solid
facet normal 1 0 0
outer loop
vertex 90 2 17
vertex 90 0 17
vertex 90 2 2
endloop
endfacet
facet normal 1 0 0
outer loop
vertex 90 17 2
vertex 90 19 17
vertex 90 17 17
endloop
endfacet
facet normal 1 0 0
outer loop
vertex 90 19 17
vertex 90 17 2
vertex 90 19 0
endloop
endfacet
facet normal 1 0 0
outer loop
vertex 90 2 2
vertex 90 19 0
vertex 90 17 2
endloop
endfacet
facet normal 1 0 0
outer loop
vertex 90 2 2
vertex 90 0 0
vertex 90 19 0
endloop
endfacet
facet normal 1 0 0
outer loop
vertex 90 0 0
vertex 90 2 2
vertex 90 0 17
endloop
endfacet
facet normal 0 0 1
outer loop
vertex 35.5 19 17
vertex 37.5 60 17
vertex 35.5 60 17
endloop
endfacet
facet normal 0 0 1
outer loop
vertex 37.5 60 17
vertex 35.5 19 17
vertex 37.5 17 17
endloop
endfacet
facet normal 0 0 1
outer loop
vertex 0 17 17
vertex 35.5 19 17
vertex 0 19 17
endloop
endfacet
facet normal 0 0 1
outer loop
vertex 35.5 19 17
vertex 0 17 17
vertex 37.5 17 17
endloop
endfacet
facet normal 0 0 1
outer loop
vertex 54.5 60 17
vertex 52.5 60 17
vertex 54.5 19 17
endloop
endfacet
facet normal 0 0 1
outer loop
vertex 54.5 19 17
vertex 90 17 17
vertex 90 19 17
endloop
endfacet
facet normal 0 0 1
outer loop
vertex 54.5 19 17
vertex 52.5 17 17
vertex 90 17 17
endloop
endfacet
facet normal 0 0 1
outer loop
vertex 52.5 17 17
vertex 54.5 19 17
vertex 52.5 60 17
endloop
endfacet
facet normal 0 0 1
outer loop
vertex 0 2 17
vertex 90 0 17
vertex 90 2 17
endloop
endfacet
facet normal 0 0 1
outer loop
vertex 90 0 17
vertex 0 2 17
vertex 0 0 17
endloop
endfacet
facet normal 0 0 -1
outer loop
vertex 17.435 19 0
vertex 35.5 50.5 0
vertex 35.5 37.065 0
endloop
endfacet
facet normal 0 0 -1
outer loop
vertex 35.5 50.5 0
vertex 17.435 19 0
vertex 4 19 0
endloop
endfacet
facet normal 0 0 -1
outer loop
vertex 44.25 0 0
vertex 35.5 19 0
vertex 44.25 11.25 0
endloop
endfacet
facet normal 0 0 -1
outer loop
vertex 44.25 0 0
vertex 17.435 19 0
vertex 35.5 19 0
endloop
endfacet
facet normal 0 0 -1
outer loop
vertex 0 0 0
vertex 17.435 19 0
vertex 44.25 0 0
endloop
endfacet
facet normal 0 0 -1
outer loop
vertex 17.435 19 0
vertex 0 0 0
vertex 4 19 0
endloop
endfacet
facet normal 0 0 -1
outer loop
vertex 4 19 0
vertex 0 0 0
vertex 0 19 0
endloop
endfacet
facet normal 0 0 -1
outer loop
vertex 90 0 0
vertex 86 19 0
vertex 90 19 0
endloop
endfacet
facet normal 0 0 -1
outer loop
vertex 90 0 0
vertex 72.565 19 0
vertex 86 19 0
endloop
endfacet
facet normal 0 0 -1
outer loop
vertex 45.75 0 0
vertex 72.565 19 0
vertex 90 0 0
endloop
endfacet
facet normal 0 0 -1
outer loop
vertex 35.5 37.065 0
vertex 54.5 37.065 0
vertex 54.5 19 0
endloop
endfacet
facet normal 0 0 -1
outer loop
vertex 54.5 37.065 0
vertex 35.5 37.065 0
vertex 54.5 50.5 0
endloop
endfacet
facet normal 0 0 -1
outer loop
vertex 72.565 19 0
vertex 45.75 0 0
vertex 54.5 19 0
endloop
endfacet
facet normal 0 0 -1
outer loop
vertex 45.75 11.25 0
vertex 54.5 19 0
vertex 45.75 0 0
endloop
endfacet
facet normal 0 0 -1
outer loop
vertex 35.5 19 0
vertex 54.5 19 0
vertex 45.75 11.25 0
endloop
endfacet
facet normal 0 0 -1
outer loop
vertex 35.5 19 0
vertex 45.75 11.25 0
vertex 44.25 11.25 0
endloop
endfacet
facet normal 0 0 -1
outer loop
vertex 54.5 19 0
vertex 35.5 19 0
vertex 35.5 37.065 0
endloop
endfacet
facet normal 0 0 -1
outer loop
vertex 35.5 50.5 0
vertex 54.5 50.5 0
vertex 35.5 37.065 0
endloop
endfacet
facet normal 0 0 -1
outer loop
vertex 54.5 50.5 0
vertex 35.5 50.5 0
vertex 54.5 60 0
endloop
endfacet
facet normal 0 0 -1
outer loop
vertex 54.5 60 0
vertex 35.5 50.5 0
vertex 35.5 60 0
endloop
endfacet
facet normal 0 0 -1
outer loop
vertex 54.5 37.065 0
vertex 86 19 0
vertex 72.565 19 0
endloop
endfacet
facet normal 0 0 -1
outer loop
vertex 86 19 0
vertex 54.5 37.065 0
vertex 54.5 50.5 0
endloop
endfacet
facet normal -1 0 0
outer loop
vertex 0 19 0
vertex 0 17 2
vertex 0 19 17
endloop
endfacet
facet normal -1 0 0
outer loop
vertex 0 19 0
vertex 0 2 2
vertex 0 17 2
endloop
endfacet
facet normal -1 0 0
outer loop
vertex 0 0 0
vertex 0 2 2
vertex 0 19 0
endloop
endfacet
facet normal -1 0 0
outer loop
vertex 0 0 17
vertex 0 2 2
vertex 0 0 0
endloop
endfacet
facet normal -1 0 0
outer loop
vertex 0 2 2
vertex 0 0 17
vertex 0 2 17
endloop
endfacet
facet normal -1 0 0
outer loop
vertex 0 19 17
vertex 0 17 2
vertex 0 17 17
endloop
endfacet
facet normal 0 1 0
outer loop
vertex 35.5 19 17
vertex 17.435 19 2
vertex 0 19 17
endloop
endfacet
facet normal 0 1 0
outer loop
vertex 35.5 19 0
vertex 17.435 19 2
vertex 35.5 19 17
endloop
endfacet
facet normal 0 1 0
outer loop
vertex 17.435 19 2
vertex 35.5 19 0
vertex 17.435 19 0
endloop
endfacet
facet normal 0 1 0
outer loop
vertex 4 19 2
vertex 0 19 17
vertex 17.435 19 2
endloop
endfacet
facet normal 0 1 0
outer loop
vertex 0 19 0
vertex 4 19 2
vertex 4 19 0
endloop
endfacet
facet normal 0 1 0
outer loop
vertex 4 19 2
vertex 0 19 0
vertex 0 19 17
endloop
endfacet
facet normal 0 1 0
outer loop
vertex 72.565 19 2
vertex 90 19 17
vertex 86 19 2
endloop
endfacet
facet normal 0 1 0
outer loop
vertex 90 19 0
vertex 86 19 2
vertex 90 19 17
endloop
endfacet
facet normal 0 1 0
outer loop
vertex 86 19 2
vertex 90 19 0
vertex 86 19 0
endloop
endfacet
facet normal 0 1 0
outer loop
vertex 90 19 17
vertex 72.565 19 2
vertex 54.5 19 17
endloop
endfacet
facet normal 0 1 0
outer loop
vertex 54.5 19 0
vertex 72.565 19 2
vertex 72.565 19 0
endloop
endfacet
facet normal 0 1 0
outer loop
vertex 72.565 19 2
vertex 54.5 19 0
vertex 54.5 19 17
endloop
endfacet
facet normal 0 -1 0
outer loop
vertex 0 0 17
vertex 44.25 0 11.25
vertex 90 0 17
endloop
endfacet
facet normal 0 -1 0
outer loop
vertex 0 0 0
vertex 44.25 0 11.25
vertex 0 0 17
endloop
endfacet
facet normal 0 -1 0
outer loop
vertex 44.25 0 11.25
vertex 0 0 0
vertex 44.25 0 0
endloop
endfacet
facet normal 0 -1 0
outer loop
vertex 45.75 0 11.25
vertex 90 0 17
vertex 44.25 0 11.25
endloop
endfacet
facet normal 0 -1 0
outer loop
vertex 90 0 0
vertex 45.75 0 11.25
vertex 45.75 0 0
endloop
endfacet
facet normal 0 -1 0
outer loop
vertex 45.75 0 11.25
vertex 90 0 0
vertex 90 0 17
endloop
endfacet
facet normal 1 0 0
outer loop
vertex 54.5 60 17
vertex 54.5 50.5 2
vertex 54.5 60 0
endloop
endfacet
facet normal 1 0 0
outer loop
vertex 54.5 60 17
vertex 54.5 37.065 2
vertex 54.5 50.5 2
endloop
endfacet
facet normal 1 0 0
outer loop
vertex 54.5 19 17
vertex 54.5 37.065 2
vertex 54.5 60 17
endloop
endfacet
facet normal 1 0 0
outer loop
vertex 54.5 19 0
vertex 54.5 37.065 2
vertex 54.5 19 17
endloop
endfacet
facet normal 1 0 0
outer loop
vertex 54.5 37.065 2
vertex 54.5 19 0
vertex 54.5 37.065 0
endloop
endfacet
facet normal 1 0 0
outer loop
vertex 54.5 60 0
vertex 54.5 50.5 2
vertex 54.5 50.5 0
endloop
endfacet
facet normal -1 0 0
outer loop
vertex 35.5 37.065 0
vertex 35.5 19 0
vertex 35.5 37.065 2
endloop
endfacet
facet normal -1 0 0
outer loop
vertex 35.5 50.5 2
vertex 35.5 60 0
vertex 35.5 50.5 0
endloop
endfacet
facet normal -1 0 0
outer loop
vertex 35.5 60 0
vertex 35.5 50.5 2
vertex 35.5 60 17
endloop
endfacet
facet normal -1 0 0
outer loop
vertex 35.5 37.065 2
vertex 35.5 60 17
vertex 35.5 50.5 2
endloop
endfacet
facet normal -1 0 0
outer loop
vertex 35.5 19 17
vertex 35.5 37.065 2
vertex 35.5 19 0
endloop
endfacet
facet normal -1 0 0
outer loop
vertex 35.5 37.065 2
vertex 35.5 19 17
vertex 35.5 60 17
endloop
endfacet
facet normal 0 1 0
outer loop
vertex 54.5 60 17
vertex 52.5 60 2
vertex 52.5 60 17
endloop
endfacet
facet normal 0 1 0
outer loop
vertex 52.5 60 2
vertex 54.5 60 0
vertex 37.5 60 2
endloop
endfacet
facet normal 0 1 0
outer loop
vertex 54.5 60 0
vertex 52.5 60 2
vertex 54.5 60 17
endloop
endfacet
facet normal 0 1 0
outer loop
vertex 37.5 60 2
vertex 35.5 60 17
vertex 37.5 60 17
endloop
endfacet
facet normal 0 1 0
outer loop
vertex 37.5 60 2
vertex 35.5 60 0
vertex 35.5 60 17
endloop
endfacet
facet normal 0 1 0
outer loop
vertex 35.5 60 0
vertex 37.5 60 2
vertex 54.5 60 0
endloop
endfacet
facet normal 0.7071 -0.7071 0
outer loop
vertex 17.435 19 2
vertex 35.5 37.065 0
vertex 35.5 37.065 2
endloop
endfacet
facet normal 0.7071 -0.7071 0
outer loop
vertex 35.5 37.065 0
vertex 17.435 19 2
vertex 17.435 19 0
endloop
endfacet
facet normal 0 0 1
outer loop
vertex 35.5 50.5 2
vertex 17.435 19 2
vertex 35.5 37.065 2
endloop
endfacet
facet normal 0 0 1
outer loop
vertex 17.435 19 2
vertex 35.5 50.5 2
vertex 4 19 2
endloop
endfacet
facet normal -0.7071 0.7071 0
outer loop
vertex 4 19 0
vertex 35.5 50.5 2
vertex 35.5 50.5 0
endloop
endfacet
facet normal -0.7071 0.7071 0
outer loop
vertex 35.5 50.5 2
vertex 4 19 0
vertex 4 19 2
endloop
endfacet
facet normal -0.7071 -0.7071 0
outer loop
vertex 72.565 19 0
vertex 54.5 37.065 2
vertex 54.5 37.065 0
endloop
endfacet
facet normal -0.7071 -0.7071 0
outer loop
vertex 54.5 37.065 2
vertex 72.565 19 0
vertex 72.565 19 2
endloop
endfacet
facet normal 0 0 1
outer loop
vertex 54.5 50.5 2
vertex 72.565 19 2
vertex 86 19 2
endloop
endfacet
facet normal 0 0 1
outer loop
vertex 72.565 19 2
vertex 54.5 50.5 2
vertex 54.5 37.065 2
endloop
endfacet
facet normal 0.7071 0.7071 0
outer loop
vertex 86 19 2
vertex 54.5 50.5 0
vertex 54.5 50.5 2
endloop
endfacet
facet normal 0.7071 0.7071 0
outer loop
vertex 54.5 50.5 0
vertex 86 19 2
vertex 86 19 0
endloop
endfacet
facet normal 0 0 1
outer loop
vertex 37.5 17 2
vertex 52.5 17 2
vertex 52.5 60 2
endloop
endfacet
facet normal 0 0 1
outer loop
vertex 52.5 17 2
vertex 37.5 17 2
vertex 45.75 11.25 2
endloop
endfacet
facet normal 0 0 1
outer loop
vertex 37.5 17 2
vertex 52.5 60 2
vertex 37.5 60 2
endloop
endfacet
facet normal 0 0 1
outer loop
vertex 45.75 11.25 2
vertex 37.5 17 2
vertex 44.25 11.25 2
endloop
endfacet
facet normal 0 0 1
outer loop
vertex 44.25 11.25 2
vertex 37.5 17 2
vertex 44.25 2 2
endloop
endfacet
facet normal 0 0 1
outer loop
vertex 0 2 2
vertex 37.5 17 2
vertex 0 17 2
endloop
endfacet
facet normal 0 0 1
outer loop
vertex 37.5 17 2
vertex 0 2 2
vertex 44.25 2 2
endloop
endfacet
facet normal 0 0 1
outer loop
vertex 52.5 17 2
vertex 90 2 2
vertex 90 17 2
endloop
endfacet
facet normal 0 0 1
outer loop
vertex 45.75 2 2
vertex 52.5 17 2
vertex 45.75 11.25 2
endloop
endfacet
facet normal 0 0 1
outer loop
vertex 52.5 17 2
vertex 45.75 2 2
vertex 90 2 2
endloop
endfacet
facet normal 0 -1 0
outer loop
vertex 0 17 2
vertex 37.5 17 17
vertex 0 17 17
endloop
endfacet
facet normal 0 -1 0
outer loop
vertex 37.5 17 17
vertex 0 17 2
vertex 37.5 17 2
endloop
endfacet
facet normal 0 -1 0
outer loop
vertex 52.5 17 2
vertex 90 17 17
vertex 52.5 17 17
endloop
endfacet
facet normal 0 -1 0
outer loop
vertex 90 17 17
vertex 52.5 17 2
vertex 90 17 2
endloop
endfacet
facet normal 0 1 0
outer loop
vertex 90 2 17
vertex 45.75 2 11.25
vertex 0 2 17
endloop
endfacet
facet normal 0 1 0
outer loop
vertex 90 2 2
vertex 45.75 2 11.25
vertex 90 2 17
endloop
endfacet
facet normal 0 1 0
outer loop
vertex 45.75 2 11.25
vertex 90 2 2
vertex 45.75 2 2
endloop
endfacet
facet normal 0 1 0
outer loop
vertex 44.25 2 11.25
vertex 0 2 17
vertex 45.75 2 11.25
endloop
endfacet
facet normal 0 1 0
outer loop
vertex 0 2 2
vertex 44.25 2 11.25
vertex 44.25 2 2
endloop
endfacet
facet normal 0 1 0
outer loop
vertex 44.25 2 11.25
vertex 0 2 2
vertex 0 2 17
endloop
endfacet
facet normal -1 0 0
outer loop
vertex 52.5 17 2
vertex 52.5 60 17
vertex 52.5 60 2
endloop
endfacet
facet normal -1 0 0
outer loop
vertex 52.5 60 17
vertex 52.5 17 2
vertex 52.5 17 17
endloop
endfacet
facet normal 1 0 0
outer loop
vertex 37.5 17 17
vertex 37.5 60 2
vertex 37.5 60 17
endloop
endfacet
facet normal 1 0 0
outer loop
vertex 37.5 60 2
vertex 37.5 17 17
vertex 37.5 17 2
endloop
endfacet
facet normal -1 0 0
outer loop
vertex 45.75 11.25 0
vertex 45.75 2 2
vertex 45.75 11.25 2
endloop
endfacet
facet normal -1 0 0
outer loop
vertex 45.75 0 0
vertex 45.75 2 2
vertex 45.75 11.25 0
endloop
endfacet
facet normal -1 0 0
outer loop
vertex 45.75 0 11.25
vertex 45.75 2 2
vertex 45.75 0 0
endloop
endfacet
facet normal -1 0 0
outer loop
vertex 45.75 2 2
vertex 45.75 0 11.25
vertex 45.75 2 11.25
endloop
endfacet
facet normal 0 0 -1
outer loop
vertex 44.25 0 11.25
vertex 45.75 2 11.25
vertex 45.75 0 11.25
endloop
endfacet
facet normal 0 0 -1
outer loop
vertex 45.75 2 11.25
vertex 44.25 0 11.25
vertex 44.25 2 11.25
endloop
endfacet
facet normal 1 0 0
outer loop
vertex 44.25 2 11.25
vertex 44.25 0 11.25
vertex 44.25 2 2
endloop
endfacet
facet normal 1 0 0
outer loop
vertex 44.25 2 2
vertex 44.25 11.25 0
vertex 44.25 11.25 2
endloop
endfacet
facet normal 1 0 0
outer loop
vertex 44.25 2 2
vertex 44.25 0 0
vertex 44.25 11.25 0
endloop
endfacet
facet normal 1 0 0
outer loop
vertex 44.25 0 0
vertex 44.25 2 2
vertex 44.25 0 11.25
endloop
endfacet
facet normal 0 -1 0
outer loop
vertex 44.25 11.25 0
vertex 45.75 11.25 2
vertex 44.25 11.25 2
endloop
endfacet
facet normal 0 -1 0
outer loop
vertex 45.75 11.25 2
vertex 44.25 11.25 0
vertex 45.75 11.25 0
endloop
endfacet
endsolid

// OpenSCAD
board_thickness = 15;
wall_strength = 2;

// Derived values, do not edit
bar_width = board_thickness + 2 * wall_strength;

difference() {
    union() {
        cube([6 * board_thickness, bar_width, board_thickness + wall_strength]);
        translate([(6 * board_thickness - bar_width)/2, 0, 0])
            cube([bar_width, 4 * board_thickness, board_thickness + wall_strength]);
        translate([0, board_thickness, 0])
            rotate([0, 0, -45])
                cube([bar_width/2, bar_width * 3, wall_strength]);
        translate([6 * board_thickness, 0, 0])
            mirror([1, 0, 0])
                translate([0, board_thickness, 0])
                    rotate([0, 0, -45])
                        cube([bar_width/2, bar_width * 3, wall_strength]);
    }
    translate([0, wall_strength, wall_strength]) {
        cube([6 * board_thickness, board_thickness, board_thickness]);
        translate([(6 * board_thickness - bar_width)/2 + wall_strength, 0, 0])
            cube([board_thickness, 5 * board_thickness, board_thickness]);
    }
    translate([3 * board_thickness, board_thickness/4, board_thickness/4])
        cube([1.5, board_thickness, board_thickness], center = true);
}
